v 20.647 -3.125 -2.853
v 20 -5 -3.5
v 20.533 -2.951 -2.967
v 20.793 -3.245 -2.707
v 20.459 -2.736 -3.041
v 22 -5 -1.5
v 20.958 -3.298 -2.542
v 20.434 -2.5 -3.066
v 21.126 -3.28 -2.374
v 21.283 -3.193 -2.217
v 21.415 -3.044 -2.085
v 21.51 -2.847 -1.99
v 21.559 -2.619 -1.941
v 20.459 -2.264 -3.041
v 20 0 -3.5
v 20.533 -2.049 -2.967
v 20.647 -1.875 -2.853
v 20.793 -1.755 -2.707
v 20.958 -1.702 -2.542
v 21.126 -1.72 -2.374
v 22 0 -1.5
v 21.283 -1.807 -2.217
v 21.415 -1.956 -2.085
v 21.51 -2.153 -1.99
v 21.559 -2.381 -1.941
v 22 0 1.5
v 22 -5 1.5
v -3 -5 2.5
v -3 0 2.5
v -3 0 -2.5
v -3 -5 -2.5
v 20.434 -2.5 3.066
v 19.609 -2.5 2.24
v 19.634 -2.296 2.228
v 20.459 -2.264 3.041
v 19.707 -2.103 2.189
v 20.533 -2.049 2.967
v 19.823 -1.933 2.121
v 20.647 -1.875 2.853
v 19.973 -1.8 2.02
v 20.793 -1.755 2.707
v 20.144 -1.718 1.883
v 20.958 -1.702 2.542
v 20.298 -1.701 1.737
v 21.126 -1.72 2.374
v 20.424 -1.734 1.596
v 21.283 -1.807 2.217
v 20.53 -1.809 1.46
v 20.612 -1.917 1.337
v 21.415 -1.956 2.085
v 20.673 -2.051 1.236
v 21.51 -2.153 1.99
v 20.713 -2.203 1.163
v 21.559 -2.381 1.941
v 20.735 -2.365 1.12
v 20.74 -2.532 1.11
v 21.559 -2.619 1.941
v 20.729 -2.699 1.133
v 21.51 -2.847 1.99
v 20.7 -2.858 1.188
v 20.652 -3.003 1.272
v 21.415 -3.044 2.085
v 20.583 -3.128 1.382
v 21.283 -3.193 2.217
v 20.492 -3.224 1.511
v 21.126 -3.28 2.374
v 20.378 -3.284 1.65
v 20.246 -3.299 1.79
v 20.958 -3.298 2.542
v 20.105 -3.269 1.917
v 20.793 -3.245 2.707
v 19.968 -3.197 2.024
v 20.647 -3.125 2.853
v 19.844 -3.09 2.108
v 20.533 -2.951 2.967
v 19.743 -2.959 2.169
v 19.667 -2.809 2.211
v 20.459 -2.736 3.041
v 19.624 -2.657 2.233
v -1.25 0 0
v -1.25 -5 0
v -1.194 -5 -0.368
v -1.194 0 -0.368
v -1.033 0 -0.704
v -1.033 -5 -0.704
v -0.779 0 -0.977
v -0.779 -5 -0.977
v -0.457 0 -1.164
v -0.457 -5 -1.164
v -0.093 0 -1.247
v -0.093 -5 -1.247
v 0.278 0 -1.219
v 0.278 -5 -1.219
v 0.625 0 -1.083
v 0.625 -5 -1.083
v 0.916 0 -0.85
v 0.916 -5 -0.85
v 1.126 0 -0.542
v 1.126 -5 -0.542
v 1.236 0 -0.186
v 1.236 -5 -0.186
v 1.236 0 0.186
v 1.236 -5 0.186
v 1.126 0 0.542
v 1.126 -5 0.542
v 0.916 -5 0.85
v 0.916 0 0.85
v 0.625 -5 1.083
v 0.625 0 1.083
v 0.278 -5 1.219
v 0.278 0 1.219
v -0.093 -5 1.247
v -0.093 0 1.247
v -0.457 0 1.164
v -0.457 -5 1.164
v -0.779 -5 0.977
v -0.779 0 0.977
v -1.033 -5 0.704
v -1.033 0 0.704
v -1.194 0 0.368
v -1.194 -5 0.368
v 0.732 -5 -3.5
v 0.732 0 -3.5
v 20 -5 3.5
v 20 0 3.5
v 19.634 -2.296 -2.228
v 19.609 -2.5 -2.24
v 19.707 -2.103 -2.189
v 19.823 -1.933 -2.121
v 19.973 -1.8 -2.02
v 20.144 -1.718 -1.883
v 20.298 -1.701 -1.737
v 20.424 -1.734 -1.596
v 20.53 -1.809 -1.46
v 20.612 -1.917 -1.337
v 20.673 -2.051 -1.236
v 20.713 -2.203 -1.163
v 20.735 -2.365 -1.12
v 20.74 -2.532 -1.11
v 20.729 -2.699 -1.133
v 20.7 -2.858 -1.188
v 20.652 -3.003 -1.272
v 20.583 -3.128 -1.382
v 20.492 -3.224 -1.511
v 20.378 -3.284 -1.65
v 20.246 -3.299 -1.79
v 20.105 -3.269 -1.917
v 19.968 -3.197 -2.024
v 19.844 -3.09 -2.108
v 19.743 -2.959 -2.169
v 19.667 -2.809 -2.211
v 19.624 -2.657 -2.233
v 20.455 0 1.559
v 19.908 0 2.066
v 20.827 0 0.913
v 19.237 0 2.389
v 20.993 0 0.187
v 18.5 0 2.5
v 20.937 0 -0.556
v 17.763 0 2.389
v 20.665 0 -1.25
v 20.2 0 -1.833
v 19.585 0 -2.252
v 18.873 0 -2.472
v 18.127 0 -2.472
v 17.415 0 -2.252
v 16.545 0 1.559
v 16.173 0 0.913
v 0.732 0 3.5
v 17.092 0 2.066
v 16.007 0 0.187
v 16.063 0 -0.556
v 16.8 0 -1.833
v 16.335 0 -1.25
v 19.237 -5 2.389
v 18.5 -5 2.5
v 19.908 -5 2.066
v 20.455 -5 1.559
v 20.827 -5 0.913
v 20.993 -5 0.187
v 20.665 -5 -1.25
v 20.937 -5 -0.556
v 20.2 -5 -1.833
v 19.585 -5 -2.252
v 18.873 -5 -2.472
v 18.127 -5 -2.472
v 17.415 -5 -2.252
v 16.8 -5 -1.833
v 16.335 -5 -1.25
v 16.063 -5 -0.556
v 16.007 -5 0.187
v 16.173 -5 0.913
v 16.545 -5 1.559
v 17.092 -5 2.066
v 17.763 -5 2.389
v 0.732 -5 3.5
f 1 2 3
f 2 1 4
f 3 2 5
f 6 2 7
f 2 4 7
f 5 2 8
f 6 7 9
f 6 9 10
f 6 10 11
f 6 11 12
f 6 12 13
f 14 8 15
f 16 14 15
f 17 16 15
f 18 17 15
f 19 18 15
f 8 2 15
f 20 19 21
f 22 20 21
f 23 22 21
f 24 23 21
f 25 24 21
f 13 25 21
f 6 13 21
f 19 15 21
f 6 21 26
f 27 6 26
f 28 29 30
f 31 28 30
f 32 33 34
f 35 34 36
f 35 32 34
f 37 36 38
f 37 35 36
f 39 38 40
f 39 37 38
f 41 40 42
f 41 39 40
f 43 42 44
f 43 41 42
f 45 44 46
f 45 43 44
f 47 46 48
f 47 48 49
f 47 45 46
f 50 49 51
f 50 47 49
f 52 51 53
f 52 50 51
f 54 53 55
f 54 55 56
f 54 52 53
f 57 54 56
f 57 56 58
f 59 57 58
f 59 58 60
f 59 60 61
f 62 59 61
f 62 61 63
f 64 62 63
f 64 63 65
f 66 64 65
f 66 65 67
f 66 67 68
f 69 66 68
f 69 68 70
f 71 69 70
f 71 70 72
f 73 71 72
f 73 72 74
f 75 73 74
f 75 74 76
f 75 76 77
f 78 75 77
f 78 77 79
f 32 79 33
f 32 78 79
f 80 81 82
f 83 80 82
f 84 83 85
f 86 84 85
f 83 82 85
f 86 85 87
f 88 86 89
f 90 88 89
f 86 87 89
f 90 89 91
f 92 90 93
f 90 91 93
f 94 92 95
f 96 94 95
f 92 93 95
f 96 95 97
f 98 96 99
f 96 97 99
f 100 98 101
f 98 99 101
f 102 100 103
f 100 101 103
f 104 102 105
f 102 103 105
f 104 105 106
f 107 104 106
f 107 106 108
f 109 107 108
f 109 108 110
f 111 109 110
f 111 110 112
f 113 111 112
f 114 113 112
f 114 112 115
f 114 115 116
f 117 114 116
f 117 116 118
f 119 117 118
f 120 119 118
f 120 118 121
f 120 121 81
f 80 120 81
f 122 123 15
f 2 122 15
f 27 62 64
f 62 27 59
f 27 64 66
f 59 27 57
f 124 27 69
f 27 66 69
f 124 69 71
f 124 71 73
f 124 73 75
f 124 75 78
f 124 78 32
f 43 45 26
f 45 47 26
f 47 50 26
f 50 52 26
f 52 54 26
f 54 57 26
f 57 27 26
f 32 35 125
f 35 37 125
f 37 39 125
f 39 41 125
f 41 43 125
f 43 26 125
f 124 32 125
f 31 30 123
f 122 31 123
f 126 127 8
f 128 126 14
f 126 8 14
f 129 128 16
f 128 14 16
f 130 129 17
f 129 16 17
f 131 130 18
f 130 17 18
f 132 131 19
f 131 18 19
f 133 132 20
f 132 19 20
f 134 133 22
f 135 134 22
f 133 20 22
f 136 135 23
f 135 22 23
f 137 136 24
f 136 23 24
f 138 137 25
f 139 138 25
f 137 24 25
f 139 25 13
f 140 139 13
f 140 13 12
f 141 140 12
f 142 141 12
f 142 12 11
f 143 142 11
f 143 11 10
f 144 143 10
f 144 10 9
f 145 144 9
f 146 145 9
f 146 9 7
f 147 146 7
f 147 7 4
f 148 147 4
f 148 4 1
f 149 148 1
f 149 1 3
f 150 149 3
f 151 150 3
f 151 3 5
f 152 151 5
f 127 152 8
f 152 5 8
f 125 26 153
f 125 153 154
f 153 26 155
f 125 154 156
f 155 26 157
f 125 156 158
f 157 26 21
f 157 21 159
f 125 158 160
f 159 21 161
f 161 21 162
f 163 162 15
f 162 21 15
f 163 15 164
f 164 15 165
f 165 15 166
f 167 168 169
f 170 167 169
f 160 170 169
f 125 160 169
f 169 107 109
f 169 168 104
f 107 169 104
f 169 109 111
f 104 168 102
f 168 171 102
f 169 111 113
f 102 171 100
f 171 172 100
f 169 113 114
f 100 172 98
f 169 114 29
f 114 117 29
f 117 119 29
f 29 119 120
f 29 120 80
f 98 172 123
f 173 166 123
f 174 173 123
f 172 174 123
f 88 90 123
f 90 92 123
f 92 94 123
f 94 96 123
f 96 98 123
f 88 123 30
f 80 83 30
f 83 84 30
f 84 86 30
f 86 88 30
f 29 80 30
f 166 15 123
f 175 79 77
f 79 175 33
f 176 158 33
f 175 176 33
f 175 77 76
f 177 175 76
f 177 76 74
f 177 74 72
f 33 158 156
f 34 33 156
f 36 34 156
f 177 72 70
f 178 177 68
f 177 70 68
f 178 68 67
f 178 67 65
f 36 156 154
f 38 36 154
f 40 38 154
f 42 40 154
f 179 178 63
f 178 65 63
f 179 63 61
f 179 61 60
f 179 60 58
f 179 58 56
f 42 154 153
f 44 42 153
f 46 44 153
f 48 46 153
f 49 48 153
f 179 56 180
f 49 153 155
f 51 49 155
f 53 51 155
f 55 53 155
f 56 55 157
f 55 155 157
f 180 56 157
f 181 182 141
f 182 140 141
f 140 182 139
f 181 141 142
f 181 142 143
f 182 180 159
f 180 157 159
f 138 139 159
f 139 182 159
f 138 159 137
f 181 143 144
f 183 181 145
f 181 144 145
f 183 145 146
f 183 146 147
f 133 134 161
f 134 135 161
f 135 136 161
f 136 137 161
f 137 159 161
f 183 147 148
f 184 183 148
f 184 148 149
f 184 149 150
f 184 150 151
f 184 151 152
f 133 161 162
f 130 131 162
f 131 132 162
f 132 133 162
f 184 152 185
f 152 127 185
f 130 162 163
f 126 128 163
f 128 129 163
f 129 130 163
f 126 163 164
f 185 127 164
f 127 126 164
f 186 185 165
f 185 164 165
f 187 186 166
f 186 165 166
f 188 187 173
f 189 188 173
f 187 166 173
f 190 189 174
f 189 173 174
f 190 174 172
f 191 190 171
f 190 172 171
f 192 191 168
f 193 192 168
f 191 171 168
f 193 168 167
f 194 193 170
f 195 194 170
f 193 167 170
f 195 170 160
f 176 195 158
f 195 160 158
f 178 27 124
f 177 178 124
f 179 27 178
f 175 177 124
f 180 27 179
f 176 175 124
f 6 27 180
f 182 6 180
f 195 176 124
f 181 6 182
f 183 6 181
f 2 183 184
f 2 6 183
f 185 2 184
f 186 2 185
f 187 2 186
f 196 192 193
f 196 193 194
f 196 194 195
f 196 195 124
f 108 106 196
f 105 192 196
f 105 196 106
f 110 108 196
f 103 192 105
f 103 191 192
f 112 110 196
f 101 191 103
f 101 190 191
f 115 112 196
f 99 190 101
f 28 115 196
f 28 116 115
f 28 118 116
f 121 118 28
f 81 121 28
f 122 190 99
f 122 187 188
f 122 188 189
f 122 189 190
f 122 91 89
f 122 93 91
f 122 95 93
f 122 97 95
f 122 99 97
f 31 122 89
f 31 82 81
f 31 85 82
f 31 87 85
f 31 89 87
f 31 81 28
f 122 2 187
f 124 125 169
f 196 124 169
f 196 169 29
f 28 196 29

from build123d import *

# Parameters (mm, degrees)
BLOCK_R                = 2.5
BOSS_EXTRUDE1_DEPTH    = 5
M3_TAPPED_HOLE1_D      = 2.5
M2_TAPPED_HOLE1_REACH  = 23.797
M2_TAPPED_HOLE1_BORE_R = 0.8


with BuildPart() as part:
    # block → Boss-Extrude1 (new body)
    with BuildSketch(Plane(origin=(0, 0, 0), x_dir=(1, 0, 0), z_dir=(0, 1, 0))):
        Polygon((0.732050808, 3.5), (20, 3.5), (22, 1.5), (22, -1.5), (20, -3.5), (0.732050808, -3.5), (-3, -2.5), (-3, 2.5), align=None)
        with Locations(Location((18.5, 0, 0), (0, 0, 270))):
            Circle(BLOCK_R, mode=Mode.SUBTRACT)
    extrude(amount=-BOSS_EXTRUDE1_DEPTH)

    # M3 Tapped Hole1 (through all)
    with Locations(Plane(origin=(0, 0, 0), x_dir=(1, 0, 0), z_dir=(0, 1, 0))):
        with Locations((0, 0)):
            Hole(M3_TAPPED_HOLE1_D / 2)

    # M2 Tapped Hole1 bore → M2 Tapped Hole1 (cut, up to next)
    with BuildSketch(Plane(origin=(11.75, 0, -11.75), x_dir=(-0.7071067811865465, 0, -0.7071067811865486), z_dir=(0.7071067811865486, 0, -0.7071067811865465)), mode=Mode.PRIVATE) as m2_tapped_hole1_sk1:
        with Locations((-13.081475452, -2.5)):
            Circle(M2_TAPPED_HOLE1_BORE_R)
    m2_tapped_hole1_tool1 = extrude(m2_tapped_hole1_sk1.sketch, amount=-M2_TAPPED_HOLE1_REACH, mode=Mode.PRIVATE) & part.part
    m2_tapped_hole1 = m2_tapped_hole1_tool1.solids().sort_by_distance((21, -2.5, -2.5))[0]
    add(m2_tapped_hole1, mode=Mode.SUBTRACT)

    # Mirror1: M2 Tapped Hole1 across plane
    add(m2_tapped_hole1.mirror(Plane.XY), mode=Mode.SUBTRACT)


solid = part.part
